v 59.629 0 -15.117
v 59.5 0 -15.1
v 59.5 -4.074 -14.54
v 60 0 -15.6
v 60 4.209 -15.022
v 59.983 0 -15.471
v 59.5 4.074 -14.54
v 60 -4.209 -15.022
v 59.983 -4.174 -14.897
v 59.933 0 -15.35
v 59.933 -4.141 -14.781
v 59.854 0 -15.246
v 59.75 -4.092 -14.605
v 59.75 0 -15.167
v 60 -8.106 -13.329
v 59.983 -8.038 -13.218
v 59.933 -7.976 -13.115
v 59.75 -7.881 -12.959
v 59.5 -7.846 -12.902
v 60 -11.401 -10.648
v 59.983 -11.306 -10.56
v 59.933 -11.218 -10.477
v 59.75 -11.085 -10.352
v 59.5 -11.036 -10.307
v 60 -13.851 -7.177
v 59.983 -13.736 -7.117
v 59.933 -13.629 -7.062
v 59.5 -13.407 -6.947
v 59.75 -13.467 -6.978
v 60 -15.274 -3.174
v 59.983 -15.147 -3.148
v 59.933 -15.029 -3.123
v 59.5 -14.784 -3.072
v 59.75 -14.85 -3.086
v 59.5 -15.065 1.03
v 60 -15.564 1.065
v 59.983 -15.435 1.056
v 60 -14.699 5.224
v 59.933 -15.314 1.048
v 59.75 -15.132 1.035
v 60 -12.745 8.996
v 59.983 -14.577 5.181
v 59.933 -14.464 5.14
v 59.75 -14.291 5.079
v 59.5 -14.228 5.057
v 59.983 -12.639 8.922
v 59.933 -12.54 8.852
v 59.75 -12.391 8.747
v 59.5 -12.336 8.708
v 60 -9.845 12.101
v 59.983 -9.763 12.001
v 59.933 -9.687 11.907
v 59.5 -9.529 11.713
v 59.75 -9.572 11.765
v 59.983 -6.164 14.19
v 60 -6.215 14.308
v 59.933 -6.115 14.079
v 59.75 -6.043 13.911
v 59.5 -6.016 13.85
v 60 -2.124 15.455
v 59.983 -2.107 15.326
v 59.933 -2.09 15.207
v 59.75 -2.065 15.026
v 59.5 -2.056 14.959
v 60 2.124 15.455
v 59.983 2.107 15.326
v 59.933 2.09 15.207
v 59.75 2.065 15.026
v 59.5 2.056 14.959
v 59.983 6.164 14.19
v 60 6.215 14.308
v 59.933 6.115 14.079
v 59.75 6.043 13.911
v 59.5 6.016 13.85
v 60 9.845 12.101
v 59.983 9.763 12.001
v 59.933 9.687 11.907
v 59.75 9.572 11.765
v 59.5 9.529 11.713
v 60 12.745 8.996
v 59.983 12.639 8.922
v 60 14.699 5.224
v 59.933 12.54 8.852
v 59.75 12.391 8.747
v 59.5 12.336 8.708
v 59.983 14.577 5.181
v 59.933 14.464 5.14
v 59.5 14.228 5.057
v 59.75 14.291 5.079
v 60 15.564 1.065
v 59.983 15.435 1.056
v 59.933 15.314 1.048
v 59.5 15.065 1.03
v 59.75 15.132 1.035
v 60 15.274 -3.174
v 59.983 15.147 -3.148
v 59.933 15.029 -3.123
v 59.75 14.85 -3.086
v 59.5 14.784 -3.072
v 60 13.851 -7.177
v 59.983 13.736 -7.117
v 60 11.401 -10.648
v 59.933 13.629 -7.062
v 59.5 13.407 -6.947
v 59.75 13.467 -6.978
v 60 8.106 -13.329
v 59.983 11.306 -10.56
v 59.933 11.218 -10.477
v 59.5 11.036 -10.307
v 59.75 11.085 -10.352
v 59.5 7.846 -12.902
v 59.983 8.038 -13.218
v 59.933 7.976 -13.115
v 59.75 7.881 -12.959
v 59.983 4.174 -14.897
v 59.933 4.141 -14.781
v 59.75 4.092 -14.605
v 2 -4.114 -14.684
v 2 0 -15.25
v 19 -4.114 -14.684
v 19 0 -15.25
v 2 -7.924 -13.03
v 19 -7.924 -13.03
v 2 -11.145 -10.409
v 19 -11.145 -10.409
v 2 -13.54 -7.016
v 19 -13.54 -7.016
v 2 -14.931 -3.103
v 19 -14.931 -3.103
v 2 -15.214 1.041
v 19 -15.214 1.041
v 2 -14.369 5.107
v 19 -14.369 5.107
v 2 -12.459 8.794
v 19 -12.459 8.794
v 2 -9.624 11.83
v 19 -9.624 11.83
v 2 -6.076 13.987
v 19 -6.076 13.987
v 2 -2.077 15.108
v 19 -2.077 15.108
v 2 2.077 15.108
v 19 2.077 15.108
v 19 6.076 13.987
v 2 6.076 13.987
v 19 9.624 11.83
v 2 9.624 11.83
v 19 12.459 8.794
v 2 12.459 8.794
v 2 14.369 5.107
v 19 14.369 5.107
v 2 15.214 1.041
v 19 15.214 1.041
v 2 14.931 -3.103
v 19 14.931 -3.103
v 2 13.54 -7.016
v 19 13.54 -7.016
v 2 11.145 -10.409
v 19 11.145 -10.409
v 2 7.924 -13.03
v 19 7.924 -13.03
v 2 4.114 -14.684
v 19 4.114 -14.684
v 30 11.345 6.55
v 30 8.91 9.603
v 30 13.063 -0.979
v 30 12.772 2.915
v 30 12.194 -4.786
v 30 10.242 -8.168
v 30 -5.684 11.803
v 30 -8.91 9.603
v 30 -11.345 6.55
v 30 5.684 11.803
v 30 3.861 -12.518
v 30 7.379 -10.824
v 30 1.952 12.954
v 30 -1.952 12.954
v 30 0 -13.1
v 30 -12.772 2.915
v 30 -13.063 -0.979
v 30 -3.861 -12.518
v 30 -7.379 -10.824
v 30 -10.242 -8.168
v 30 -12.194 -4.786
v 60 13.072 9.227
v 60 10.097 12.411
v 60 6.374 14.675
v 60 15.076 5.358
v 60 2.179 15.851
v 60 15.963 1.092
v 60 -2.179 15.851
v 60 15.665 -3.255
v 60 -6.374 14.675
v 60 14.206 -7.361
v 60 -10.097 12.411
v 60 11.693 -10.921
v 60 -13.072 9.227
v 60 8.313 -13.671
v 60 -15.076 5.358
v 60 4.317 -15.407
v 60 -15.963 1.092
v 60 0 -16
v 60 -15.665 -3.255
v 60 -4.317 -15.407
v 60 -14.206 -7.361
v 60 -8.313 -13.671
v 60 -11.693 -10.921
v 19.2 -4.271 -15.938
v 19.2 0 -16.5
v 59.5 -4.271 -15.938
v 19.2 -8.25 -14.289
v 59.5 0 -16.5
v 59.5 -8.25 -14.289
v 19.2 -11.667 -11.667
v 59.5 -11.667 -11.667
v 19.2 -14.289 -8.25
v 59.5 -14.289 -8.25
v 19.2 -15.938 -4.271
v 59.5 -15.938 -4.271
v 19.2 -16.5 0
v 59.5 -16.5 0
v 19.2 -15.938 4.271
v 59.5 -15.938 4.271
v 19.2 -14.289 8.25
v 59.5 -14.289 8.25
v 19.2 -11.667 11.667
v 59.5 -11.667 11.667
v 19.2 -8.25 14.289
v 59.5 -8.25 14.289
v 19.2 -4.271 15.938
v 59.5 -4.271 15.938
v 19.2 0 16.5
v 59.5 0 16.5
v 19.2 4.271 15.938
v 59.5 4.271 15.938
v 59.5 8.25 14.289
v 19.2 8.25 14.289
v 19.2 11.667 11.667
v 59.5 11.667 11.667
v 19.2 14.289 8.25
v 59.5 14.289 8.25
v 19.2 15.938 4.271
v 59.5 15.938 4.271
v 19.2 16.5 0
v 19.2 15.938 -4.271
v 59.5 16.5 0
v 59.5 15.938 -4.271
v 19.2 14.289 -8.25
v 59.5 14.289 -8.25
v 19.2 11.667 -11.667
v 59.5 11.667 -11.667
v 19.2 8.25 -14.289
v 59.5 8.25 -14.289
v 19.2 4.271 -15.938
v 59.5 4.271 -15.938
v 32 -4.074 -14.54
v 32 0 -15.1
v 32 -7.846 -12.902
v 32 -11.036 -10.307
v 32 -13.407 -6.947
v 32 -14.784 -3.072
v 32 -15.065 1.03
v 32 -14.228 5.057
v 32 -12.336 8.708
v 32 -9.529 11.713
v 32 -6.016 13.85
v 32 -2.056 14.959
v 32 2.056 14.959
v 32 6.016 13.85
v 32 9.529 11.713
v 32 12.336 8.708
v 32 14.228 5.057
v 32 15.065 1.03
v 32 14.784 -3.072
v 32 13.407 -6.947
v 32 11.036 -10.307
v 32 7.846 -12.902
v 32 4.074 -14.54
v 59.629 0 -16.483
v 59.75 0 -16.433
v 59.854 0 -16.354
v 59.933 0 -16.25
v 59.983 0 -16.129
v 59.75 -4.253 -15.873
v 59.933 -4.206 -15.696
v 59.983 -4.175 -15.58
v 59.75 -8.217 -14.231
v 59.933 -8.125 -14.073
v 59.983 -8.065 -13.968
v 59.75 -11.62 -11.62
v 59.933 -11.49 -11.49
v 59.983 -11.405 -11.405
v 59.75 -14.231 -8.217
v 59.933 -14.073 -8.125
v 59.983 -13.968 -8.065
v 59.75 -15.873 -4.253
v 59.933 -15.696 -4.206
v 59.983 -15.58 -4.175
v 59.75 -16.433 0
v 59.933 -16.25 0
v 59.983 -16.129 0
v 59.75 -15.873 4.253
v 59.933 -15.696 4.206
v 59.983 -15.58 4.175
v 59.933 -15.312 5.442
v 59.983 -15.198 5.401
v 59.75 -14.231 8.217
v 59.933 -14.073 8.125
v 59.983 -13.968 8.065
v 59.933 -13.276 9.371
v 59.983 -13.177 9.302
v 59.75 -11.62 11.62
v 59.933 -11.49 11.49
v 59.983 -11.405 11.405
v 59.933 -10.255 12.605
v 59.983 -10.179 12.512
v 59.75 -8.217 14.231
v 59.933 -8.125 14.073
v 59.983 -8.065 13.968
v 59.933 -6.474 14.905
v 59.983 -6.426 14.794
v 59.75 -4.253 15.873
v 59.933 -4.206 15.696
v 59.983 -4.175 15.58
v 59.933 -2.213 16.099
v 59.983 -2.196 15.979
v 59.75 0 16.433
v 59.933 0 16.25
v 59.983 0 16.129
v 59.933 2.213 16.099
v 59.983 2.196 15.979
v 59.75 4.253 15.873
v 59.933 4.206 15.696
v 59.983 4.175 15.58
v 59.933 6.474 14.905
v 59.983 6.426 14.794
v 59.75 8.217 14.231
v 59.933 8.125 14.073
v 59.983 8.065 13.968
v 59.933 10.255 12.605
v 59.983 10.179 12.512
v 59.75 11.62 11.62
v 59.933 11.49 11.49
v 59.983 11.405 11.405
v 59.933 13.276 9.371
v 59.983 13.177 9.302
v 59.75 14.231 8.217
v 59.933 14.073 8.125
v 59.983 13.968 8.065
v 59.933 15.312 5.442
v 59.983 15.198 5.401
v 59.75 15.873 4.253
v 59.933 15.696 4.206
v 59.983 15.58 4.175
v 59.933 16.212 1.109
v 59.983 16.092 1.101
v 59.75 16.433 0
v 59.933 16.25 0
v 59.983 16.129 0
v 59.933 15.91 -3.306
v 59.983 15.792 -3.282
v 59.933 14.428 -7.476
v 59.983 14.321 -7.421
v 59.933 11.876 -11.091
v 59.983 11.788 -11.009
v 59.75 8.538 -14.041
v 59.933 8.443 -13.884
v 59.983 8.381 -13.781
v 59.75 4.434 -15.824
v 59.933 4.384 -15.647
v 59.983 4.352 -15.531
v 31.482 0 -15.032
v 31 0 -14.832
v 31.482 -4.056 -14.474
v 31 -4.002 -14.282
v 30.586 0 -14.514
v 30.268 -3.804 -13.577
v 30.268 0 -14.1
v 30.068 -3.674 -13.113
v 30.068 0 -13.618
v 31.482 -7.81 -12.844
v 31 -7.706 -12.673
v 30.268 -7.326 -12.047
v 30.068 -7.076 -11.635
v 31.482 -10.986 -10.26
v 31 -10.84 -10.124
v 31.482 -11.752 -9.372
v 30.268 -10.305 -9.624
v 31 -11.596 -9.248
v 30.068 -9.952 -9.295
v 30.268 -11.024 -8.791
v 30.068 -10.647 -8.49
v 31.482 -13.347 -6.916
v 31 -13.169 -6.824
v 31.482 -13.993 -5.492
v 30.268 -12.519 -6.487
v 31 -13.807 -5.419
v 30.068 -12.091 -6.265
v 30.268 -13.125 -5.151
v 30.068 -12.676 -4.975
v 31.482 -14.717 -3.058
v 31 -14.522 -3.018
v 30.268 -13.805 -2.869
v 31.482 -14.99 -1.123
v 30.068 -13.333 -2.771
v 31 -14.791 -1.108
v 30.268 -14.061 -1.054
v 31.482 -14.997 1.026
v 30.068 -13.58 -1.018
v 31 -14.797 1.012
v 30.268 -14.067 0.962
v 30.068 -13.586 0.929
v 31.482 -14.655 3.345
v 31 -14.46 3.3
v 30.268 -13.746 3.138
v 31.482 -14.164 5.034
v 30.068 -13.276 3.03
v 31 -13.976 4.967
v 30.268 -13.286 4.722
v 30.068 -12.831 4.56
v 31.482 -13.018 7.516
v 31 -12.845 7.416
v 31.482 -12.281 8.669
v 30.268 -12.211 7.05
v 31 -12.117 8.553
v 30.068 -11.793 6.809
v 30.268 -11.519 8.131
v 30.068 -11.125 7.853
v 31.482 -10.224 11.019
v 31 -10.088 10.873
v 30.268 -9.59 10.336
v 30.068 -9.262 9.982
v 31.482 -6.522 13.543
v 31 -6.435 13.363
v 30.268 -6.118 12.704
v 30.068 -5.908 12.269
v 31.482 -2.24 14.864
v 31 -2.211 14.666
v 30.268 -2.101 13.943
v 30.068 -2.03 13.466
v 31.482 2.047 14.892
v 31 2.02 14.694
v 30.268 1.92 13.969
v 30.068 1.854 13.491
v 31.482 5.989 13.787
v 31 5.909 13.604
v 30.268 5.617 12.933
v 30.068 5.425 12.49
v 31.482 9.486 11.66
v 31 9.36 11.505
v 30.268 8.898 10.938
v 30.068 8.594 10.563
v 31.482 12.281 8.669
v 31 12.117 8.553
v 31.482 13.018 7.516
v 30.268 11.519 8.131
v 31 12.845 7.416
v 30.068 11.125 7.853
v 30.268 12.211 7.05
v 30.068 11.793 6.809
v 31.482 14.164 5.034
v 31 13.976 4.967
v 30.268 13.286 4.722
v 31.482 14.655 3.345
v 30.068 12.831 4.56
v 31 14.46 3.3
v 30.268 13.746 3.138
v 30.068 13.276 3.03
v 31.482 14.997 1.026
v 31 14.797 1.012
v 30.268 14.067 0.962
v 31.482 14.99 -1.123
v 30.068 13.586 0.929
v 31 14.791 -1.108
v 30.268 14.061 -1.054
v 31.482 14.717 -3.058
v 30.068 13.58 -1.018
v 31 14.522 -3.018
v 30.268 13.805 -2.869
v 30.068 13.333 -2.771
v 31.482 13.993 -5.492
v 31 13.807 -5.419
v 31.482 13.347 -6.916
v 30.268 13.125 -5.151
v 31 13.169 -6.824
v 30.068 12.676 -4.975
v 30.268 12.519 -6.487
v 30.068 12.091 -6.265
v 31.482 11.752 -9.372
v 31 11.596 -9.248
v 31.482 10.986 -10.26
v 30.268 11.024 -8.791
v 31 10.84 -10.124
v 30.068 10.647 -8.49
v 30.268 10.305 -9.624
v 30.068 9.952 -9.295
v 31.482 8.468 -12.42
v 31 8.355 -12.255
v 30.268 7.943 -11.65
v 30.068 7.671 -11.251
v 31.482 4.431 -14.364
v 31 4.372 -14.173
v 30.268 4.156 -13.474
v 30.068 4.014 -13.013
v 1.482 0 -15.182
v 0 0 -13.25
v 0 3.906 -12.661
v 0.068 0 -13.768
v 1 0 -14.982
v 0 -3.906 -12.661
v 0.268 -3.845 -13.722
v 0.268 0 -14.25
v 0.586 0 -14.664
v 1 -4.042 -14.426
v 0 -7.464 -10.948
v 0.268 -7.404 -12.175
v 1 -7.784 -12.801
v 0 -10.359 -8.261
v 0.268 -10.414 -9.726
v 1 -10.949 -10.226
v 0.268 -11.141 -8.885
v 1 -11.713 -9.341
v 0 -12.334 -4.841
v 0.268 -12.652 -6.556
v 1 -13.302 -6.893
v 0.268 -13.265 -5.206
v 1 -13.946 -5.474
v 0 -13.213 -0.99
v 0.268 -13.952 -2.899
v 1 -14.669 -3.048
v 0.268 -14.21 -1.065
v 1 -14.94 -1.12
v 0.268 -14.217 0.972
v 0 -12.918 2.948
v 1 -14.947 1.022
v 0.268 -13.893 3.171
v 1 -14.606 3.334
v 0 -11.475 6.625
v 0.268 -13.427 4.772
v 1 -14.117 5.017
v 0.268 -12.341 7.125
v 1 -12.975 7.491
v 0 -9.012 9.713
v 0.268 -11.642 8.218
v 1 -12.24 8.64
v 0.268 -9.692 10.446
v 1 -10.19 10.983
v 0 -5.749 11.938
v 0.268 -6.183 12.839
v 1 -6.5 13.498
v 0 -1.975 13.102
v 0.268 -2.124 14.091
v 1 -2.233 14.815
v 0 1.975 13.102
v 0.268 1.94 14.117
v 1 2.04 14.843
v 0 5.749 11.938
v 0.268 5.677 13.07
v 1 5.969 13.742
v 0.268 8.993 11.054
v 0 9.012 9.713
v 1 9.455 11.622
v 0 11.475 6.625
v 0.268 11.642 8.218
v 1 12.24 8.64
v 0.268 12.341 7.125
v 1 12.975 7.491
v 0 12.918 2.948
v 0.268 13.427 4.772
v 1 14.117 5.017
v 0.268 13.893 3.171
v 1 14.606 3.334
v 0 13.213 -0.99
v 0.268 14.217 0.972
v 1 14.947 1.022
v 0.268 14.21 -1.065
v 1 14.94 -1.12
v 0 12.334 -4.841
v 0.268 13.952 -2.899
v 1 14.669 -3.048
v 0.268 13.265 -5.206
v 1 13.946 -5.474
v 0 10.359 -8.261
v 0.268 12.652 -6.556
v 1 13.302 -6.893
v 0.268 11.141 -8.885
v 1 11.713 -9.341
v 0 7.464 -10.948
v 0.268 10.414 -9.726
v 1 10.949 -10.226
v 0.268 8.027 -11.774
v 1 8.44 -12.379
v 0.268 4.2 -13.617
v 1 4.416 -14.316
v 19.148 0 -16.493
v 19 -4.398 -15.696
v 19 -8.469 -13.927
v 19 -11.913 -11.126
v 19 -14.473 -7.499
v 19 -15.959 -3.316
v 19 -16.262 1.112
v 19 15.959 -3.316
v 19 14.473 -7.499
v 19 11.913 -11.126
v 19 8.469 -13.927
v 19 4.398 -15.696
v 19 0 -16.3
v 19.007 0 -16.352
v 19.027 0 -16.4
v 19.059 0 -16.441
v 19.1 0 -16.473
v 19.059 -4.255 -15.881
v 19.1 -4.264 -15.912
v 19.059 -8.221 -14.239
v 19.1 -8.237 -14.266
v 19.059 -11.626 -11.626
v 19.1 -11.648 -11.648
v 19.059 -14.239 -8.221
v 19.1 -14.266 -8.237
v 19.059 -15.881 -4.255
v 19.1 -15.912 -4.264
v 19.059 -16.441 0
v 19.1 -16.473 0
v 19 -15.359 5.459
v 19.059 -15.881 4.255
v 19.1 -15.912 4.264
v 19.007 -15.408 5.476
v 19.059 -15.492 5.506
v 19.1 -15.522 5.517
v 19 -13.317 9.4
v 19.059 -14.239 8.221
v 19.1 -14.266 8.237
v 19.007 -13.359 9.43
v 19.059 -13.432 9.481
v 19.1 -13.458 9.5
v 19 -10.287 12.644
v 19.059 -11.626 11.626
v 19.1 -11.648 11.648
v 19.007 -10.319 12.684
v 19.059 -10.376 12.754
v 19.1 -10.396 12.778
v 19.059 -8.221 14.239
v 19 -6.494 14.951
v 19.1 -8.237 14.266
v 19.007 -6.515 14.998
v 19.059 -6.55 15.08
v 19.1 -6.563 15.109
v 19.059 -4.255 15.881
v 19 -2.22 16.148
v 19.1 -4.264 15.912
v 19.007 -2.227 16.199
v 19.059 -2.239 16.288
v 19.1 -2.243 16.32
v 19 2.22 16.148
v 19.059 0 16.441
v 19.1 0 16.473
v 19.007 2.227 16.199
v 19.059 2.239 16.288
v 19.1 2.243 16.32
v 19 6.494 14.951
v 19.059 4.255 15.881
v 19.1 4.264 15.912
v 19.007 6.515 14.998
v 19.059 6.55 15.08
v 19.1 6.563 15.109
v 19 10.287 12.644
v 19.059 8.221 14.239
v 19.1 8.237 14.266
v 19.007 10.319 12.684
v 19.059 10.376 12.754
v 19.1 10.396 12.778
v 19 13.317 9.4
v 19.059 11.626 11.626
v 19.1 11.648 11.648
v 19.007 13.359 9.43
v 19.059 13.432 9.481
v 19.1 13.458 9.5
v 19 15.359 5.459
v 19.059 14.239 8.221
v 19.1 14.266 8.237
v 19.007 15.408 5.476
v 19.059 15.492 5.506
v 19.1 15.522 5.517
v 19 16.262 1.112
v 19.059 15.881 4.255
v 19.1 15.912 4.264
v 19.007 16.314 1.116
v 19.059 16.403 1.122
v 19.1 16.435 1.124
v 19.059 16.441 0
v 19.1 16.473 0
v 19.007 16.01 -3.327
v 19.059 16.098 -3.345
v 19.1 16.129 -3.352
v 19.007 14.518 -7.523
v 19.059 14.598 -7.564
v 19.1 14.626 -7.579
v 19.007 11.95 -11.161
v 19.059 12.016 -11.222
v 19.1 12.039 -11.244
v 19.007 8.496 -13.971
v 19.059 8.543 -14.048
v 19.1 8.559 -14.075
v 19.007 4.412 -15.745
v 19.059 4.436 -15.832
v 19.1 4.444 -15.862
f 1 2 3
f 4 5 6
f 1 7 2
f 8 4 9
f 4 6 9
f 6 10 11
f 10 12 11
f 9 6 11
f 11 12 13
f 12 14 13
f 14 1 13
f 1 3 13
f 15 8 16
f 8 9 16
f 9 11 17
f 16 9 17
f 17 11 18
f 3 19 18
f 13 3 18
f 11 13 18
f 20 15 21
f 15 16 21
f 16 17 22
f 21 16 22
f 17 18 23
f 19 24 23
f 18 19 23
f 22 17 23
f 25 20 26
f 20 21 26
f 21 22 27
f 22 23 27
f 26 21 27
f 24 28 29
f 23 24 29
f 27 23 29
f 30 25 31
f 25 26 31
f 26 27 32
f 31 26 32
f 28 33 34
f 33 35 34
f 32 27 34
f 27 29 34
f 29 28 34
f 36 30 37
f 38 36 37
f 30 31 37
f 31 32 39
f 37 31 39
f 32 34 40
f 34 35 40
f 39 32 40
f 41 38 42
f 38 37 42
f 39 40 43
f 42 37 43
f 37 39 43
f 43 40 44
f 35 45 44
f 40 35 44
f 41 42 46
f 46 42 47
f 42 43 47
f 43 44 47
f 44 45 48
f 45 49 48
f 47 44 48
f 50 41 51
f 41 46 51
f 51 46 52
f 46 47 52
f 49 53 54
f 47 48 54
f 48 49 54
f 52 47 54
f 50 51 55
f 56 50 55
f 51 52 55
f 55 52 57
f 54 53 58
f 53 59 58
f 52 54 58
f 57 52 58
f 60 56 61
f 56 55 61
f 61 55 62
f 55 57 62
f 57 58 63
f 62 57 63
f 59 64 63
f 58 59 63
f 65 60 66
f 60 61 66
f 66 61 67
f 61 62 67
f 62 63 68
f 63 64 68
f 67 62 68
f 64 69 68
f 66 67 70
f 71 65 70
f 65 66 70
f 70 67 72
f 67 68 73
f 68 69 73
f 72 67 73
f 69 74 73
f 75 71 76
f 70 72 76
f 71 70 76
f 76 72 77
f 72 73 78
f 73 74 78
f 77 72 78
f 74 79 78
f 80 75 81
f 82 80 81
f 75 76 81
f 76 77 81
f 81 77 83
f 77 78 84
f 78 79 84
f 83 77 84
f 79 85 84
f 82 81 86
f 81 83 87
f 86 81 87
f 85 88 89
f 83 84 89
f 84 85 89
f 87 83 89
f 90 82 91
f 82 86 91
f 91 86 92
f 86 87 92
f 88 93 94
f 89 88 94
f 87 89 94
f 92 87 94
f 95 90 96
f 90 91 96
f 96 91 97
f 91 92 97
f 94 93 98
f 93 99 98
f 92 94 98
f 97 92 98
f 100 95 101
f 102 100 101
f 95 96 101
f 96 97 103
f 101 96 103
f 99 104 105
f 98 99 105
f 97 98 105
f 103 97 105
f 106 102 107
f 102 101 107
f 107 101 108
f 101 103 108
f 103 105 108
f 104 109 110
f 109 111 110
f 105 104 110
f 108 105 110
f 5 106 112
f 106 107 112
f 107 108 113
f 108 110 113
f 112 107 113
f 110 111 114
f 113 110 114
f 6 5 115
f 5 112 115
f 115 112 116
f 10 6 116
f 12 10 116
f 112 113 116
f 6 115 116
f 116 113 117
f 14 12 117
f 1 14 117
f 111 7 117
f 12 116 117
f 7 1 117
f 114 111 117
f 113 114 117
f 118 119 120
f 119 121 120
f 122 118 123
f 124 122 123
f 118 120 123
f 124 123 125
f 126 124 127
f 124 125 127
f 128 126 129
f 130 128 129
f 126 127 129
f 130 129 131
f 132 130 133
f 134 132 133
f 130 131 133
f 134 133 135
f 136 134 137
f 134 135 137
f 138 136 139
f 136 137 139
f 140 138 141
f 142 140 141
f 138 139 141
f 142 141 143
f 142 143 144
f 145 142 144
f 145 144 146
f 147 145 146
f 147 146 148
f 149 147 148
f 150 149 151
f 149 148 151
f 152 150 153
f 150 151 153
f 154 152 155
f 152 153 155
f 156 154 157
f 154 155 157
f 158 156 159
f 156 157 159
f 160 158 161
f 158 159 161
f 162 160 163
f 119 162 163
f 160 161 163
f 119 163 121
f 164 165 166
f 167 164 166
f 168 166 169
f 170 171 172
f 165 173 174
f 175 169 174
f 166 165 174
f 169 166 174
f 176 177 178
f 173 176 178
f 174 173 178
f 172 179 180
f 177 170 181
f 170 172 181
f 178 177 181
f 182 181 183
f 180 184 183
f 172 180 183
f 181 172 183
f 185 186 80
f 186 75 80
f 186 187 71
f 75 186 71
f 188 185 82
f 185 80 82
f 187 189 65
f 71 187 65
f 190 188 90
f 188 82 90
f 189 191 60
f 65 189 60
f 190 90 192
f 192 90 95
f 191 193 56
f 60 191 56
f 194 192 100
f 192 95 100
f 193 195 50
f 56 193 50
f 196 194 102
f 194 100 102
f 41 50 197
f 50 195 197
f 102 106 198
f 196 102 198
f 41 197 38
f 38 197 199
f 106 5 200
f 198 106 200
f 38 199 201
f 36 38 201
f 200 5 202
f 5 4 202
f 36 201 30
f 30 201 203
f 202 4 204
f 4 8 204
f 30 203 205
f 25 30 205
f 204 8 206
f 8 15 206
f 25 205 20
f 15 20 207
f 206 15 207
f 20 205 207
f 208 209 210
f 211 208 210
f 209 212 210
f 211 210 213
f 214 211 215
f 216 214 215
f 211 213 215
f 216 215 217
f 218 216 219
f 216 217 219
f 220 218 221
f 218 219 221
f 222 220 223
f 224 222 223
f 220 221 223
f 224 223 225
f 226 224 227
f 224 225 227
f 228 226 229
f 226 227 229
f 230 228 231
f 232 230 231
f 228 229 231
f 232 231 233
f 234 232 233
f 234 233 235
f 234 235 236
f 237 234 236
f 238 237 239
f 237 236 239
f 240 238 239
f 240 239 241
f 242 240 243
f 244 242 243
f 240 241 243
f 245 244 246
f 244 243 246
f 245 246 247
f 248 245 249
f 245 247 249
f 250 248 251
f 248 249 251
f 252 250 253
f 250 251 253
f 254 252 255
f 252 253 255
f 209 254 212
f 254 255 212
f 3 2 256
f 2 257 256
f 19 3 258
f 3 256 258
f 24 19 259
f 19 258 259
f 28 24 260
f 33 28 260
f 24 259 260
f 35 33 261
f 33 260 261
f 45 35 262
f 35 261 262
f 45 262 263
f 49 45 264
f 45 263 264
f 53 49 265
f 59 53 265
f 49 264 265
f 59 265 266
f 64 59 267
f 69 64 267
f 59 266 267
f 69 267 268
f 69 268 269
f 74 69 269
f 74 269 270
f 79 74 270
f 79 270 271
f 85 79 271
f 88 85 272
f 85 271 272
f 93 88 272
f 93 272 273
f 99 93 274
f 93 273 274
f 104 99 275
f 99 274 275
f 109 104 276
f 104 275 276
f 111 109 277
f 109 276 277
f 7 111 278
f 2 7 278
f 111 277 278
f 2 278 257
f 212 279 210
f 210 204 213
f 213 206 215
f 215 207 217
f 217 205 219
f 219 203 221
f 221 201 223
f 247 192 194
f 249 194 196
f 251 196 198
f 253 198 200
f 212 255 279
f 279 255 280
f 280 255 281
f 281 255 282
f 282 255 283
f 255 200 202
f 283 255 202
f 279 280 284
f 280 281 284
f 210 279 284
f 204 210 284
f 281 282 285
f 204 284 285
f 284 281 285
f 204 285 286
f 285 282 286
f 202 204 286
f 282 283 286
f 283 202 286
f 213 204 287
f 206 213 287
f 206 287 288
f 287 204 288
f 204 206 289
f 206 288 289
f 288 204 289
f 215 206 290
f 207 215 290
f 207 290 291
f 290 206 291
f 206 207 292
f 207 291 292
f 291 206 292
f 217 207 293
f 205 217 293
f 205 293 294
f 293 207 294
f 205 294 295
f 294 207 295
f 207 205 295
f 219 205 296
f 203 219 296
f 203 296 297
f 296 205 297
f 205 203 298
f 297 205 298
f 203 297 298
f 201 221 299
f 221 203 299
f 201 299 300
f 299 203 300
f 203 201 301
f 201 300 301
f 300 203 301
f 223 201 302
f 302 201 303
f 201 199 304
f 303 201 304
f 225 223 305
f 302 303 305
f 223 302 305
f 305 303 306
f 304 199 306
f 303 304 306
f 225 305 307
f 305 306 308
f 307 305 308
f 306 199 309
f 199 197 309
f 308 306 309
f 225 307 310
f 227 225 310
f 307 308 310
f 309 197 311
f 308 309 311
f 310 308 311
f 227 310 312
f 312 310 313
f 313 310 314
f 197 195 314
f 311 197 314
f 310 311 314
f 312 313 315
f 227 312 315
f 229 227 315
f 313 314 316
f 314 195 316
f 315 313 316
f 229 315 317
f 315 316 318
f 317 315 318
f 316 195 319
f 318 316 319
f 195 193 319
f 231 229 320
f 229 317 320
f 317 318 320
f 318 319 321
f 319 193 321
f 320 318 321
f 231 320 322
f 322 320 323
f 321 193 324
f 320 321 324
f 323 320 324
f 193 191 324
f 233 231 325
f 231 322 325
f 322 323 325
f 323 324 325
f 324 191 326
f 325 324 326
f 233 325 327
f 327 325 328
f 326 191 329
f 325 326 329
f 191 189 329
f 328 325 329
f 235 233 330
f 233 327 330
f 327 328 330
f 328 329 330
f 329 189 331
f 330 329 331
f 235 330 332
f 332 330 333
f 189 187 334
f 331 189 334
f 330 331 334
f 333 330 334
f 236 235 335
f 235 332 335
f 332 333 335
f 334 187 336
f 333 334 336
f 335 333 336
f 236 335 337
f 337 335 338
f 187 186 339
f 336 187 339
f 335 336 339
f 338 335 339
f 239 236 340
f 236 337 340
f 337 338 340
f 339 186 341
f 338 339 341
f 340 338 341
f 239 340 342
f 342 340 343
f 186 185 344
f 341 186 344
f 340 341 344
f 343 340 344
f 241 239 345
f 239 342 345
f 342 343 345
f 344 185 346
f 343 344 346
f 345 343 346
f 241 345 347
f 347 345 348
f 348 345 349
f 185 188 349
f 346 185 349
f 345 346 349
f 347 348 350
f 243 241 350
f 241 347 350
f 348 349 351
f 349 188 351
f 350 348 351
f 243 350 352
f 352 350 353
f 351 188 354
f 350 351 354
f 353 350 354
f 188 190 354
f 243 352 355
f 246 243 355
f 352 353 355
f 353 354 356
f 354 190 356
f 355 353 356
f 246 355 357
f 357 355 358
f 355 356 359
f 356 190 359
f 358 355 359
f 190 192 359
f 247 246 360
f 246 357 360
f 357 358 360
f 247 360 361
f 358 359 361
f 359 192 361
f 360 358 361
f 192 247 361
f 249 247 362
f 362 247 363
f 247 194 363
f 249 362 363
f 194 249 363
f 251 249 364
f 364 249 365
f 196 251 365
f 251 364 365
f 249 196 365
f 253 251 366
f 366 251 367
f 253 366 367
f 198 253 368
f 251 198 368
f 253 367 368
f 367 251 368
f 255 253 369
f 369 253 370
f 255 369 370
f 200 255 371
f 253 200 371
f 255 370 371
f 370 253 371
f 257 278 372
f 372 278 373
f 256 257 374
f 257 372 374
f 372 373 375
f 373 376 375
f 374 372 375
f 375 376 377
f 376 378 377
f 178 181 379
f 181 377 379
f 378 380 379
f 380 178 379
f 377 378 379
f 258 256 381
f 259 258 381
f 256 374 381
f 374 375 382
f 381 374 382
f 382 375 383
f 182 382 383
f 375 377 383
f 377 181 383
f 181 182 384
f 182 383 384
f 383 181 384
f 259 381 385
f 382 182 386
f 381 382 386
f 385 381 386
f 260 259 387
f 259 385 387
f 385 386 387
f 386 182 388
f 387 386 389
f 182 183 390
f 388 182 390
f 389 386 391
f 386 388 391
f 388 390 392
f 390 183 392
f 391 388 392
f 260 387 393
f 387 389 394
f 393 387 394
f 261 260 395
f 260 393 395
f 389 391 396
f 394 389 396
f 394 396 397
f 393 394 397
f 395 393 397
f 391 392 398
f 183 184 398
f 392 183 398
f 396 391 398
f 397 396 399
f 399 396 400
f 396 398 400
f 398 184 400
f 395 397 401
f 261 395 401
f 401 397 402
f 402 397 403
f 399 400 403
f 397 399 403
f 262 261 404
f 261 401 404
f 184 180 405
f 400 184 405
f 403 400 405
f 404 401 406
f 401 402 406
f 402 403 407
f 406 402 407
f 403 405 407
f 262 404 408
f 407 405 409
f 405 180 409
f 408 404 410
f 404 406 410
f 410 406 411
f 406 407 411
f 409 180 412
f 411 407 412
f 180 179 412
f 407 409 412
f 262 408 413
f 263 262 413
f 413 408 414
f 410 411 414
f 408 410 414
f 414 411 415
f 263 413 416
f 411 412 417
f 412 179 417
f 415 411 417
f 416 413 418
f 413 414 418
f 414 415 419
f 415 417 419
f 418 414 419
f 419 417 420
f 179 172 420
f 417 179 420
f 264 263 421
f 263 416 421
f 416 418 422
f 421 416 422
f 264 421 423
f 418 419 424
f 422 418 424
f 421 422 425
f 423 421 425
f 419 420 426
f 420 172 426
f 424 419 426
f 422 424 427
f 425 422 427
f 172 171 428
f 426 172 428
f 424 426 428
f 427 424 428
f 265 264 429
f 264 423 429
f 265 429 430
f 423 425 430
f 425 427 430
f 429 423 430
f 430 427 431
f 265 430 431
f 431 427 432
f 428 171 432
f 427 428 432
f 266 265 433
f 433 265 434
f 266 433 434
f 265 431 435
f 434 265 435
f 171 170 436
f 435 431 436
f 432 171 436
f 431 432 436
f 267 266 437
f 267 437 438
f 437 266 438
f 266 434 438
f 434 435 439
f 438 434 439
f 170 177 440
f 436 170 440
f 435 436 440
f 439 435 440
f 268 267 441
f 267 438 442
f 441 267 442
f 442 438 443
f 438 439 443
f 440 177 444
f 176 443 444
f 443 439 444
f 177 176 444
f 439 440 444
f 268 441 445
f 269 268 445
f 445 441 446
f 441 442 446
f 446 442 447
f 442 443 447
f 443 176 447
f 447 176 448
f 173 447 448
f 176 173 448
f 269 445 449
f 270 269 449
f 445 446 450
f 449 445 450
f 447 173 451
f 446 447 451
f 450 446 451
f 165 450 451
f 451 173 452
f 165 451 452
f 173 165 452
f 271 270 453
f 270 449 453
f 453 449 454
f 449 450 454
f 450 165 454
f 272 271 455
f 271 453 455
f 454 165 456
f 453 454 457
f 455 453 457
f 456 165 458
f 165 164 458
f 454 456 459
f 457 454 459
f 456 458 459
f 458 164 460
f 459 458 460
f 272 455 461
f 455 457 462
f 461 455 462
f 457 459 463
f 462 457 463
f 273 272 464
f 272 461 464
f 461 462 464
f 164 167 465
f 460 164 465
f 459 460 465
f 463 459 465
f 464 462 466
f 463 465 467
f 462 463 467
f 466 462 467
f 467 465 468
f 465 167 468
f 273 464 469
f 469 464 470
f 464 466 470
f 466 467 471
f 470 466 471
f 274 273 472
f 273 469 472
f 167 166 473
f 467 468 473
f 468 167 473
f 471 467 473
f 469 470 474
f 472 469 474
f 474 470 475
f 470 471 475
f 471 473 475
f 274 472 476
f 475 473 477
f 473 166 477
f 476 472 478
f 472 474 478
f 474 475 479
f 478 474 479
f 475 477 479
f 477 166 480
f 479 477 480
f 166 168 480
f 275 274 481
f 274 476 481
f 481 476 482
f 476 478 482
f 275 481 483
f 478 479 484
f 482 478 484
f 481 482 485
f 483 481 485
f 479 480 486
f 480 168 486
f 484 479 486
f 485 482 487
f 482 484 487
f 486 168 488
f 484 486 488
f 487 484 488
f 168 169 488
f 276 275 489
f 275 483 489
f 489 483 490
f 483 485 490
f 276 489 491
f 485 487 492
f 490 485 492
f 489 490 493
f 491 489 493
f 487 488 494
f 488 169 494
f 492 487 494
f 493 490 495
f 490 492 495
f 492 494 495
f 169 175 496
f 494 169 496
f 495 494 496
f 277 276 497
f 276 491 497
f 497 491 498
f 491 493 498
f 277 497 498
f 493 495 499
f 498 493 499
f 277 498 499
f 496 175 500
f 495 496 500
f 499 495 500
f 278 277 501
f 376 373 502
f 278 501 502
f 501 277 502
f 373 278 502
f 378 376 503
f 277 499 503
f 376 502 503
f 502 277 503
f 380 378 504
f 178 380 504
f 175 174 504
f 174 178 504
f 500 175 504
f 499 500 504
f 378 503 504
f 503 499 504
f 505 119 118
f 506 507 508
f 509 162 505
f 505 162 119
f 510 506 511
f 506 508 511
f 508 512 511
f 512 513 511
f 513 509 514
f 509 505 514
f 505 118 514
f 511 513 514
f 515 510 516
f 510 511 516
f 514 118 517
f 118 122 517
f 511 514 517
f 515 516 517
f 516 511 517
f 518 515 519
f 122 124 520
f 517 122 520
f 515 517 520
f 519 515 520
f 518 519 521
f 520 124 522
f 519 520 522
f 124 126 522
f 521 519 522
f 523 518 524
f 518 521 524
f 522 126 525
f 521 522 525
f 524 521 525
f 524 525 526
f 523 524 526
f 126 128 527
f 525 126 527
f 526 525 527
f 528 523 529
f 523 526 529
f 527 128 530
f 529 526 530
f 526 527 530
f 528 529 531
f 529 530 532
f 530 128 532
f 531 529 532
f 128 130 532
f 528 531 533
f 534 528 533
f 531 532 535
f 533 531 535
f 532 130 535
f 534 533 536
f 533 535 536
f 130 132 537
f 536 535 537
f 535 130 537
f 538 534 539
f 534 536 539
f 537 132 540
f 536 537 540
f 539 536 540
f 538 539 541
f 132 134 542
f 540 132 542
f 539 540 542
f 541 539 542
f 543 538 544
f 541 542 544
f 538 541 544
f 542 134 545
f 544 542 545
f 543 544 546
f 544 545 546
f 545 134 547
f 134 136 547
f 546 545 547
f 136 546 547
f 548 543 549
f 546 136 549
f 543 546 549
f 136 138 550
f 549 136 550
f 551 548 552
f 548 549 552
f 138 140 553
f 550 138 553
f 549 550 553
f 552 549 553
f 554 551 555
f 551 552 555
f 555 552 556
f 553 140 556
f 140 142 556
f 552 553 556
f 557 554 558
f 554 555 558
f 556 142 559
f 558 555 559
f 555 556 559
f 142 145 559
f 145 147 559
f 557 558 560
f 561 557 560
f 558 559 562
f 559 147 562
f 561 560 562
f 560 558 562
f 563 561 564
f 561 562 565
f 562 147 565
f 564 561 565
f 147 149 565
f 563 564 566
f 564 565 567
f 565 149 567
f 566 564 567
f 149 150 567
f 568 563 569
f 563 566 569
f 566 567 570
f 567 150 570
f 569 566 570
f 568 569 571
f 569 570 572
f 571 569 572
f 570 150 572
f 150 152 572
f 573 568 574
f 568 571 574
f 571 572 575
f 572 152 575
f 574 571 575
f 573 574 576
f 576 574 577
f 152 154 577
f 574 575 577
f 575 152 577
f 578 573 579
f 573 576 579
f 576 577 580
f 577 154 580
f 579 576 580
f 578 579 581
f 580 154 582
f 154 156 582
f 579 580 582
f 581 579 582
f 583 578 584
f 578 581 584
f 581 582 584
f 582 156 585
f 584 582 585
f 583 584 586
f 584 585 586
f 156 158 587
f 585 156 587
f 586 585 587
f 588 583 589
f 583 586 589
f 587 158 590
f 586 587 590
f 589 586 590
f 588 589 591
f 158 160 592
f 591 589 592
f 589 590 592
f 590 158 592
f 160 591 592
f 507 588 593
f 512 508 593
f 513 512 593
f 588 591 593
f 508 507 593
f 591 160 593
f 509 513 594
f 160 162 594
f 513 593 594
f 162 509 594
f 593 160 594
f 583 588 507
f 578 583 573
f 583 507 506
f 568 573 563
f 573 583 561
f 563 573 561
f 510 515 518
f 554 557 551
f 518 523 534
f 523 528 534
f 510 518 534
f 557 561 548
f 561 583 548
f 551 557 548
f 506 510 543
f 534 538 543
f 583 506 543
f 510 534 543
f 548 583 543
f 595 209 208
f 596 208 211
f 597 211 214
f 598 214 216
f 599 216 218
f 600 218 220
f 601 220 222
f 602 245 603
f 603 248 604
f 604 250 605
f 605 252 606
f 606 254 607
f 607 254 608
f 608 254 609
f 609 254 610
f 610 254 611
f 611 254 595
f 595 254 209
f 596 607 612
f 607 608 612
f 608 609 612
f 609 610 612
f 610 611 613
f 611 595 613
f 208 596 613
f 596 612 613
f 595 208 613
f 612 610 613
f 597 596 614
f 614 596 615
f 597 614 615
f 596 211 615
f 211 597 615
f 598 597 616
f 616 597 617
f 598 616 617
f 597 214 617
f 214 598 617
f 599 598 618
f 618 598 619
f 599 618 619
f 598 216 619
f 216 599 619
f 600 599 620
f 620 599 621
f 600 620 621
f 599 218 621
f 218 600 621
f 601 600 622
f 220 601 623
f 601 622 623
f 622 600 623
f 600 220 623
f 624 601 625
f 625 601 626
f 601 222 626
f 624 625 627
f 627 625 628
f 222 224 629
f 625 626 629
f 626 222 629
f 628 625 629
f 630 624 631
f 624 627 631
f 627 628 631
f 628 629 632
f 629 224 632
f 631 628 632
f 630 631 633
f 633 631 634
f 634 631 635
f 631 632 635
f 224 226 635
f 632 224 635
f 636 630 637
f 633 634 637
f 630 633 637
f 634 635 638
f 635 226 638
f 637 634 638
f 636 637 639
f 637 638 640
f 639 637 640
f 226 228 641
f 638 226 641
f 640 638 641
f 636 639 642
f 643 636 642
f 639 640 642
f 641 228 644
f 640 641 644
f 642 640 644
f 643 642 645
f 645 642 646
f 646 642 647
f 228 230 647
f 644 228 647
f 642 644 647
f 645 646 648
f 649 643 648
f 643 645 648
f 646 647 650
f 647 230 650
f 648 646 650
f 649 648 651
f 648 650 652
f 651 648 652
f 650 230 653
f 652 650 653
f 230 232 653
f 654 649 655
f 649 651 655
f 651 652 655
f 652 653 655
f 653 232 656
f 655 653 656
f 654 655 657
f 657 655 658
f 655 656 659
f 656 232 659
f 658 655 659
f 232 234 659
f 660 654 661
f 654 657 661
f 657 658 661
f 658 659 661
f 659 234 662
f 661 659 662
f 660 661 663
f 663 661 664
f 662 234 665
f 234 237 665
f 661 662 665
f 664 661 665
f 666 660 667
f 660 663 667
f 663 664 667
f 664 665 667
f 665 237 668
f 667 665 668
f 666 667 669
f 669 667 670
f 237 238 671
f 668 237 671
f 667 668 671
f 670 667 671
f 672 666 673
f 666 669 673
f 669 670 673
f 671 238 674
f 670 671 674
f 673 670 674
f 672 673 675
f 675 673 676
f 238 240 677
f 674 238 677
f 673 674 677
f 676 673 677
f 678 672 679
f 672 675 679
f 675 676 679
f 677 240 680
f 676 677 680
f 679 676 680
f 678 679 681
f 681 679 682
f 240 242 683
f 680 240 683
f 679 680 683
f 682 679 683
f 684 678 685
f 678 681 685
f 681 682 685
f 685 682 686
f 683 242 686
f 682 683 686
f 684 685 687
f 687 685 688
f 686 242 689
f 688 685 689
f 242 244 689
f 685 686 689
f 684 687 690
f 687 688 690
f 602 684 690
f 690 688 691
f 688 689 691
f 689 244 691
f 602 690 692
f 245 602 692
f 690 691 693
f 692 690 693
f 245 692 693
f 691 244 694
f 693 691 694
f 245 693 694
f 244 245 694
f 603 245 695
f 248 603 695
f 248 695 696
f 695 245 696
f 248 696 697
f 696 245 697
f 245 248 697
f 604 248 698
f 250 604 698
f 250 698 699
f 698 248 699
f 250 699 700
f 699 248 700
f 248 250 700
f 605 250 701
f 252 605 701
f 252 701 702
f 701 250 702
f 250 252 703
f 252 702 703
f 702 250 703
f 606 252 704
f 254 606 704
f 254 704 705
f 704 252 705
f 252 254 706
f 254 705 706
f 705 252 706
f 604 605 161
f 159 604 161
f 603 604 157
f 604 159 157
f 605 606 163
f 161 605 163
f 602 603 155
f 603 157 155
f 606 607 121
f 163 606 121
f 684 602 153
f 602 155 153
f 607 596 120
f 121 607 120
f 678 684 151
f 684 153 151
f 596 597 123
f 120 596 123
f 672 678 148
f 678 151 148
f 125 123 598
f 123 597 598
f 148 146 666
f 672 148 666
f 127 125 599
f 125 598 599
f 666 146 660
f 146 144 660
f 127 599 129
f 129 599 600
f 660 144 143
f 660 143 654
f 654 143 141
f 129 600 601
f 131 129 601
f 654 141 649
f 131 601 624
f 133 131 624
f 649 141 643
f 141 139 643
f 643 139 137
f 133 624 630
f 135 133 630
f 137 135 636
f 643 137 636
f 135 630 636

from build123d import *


with BuildPart() as part:
    # Sketch1 → Revolve1 (revolve)
    with BuildSketch(Plane(origin=(0, 0, 0), x_dir=(1, 0, 0), z_dir=(0, 1, 0))):
        with BuildLine():
            Line((0, 0), (0, 13.25))
            ThreePointArc((0, 13.25), (0.585786438, 14.664213562), (2, 15.25))
            Line((2, 15.25), (19, 15.25))
            Line((19, 15.25), (19, 16.3))
            ThreePointArc((19, 16.3), (19.058578644, 16.441421356), (19.2, 16.5))
            Line((19.2, 16.5), (59.5, 16.5))
            ThreePointArc((59.5, 16.5), (59.853553391, 16.353553391), (60, 16))
            Line((60, 16), (60, 15.6))
            ThreePointArc((60, 15.6), (59.853553391, 15.246446609), (59.5, 15.1))
            Line((59.5, 15.1), (32, 15.1))
            ThreePointArc((32, 15.1), (30.585786438, 14.514213562), (30, 13.1))
            Line((30, 13.1), (30, 0))
            Line((30, 0), (0, 0))
        make_face()
    revolve(axis=Axis((30, 0, 0), (-1, 0, 0)))


solid = part.part
